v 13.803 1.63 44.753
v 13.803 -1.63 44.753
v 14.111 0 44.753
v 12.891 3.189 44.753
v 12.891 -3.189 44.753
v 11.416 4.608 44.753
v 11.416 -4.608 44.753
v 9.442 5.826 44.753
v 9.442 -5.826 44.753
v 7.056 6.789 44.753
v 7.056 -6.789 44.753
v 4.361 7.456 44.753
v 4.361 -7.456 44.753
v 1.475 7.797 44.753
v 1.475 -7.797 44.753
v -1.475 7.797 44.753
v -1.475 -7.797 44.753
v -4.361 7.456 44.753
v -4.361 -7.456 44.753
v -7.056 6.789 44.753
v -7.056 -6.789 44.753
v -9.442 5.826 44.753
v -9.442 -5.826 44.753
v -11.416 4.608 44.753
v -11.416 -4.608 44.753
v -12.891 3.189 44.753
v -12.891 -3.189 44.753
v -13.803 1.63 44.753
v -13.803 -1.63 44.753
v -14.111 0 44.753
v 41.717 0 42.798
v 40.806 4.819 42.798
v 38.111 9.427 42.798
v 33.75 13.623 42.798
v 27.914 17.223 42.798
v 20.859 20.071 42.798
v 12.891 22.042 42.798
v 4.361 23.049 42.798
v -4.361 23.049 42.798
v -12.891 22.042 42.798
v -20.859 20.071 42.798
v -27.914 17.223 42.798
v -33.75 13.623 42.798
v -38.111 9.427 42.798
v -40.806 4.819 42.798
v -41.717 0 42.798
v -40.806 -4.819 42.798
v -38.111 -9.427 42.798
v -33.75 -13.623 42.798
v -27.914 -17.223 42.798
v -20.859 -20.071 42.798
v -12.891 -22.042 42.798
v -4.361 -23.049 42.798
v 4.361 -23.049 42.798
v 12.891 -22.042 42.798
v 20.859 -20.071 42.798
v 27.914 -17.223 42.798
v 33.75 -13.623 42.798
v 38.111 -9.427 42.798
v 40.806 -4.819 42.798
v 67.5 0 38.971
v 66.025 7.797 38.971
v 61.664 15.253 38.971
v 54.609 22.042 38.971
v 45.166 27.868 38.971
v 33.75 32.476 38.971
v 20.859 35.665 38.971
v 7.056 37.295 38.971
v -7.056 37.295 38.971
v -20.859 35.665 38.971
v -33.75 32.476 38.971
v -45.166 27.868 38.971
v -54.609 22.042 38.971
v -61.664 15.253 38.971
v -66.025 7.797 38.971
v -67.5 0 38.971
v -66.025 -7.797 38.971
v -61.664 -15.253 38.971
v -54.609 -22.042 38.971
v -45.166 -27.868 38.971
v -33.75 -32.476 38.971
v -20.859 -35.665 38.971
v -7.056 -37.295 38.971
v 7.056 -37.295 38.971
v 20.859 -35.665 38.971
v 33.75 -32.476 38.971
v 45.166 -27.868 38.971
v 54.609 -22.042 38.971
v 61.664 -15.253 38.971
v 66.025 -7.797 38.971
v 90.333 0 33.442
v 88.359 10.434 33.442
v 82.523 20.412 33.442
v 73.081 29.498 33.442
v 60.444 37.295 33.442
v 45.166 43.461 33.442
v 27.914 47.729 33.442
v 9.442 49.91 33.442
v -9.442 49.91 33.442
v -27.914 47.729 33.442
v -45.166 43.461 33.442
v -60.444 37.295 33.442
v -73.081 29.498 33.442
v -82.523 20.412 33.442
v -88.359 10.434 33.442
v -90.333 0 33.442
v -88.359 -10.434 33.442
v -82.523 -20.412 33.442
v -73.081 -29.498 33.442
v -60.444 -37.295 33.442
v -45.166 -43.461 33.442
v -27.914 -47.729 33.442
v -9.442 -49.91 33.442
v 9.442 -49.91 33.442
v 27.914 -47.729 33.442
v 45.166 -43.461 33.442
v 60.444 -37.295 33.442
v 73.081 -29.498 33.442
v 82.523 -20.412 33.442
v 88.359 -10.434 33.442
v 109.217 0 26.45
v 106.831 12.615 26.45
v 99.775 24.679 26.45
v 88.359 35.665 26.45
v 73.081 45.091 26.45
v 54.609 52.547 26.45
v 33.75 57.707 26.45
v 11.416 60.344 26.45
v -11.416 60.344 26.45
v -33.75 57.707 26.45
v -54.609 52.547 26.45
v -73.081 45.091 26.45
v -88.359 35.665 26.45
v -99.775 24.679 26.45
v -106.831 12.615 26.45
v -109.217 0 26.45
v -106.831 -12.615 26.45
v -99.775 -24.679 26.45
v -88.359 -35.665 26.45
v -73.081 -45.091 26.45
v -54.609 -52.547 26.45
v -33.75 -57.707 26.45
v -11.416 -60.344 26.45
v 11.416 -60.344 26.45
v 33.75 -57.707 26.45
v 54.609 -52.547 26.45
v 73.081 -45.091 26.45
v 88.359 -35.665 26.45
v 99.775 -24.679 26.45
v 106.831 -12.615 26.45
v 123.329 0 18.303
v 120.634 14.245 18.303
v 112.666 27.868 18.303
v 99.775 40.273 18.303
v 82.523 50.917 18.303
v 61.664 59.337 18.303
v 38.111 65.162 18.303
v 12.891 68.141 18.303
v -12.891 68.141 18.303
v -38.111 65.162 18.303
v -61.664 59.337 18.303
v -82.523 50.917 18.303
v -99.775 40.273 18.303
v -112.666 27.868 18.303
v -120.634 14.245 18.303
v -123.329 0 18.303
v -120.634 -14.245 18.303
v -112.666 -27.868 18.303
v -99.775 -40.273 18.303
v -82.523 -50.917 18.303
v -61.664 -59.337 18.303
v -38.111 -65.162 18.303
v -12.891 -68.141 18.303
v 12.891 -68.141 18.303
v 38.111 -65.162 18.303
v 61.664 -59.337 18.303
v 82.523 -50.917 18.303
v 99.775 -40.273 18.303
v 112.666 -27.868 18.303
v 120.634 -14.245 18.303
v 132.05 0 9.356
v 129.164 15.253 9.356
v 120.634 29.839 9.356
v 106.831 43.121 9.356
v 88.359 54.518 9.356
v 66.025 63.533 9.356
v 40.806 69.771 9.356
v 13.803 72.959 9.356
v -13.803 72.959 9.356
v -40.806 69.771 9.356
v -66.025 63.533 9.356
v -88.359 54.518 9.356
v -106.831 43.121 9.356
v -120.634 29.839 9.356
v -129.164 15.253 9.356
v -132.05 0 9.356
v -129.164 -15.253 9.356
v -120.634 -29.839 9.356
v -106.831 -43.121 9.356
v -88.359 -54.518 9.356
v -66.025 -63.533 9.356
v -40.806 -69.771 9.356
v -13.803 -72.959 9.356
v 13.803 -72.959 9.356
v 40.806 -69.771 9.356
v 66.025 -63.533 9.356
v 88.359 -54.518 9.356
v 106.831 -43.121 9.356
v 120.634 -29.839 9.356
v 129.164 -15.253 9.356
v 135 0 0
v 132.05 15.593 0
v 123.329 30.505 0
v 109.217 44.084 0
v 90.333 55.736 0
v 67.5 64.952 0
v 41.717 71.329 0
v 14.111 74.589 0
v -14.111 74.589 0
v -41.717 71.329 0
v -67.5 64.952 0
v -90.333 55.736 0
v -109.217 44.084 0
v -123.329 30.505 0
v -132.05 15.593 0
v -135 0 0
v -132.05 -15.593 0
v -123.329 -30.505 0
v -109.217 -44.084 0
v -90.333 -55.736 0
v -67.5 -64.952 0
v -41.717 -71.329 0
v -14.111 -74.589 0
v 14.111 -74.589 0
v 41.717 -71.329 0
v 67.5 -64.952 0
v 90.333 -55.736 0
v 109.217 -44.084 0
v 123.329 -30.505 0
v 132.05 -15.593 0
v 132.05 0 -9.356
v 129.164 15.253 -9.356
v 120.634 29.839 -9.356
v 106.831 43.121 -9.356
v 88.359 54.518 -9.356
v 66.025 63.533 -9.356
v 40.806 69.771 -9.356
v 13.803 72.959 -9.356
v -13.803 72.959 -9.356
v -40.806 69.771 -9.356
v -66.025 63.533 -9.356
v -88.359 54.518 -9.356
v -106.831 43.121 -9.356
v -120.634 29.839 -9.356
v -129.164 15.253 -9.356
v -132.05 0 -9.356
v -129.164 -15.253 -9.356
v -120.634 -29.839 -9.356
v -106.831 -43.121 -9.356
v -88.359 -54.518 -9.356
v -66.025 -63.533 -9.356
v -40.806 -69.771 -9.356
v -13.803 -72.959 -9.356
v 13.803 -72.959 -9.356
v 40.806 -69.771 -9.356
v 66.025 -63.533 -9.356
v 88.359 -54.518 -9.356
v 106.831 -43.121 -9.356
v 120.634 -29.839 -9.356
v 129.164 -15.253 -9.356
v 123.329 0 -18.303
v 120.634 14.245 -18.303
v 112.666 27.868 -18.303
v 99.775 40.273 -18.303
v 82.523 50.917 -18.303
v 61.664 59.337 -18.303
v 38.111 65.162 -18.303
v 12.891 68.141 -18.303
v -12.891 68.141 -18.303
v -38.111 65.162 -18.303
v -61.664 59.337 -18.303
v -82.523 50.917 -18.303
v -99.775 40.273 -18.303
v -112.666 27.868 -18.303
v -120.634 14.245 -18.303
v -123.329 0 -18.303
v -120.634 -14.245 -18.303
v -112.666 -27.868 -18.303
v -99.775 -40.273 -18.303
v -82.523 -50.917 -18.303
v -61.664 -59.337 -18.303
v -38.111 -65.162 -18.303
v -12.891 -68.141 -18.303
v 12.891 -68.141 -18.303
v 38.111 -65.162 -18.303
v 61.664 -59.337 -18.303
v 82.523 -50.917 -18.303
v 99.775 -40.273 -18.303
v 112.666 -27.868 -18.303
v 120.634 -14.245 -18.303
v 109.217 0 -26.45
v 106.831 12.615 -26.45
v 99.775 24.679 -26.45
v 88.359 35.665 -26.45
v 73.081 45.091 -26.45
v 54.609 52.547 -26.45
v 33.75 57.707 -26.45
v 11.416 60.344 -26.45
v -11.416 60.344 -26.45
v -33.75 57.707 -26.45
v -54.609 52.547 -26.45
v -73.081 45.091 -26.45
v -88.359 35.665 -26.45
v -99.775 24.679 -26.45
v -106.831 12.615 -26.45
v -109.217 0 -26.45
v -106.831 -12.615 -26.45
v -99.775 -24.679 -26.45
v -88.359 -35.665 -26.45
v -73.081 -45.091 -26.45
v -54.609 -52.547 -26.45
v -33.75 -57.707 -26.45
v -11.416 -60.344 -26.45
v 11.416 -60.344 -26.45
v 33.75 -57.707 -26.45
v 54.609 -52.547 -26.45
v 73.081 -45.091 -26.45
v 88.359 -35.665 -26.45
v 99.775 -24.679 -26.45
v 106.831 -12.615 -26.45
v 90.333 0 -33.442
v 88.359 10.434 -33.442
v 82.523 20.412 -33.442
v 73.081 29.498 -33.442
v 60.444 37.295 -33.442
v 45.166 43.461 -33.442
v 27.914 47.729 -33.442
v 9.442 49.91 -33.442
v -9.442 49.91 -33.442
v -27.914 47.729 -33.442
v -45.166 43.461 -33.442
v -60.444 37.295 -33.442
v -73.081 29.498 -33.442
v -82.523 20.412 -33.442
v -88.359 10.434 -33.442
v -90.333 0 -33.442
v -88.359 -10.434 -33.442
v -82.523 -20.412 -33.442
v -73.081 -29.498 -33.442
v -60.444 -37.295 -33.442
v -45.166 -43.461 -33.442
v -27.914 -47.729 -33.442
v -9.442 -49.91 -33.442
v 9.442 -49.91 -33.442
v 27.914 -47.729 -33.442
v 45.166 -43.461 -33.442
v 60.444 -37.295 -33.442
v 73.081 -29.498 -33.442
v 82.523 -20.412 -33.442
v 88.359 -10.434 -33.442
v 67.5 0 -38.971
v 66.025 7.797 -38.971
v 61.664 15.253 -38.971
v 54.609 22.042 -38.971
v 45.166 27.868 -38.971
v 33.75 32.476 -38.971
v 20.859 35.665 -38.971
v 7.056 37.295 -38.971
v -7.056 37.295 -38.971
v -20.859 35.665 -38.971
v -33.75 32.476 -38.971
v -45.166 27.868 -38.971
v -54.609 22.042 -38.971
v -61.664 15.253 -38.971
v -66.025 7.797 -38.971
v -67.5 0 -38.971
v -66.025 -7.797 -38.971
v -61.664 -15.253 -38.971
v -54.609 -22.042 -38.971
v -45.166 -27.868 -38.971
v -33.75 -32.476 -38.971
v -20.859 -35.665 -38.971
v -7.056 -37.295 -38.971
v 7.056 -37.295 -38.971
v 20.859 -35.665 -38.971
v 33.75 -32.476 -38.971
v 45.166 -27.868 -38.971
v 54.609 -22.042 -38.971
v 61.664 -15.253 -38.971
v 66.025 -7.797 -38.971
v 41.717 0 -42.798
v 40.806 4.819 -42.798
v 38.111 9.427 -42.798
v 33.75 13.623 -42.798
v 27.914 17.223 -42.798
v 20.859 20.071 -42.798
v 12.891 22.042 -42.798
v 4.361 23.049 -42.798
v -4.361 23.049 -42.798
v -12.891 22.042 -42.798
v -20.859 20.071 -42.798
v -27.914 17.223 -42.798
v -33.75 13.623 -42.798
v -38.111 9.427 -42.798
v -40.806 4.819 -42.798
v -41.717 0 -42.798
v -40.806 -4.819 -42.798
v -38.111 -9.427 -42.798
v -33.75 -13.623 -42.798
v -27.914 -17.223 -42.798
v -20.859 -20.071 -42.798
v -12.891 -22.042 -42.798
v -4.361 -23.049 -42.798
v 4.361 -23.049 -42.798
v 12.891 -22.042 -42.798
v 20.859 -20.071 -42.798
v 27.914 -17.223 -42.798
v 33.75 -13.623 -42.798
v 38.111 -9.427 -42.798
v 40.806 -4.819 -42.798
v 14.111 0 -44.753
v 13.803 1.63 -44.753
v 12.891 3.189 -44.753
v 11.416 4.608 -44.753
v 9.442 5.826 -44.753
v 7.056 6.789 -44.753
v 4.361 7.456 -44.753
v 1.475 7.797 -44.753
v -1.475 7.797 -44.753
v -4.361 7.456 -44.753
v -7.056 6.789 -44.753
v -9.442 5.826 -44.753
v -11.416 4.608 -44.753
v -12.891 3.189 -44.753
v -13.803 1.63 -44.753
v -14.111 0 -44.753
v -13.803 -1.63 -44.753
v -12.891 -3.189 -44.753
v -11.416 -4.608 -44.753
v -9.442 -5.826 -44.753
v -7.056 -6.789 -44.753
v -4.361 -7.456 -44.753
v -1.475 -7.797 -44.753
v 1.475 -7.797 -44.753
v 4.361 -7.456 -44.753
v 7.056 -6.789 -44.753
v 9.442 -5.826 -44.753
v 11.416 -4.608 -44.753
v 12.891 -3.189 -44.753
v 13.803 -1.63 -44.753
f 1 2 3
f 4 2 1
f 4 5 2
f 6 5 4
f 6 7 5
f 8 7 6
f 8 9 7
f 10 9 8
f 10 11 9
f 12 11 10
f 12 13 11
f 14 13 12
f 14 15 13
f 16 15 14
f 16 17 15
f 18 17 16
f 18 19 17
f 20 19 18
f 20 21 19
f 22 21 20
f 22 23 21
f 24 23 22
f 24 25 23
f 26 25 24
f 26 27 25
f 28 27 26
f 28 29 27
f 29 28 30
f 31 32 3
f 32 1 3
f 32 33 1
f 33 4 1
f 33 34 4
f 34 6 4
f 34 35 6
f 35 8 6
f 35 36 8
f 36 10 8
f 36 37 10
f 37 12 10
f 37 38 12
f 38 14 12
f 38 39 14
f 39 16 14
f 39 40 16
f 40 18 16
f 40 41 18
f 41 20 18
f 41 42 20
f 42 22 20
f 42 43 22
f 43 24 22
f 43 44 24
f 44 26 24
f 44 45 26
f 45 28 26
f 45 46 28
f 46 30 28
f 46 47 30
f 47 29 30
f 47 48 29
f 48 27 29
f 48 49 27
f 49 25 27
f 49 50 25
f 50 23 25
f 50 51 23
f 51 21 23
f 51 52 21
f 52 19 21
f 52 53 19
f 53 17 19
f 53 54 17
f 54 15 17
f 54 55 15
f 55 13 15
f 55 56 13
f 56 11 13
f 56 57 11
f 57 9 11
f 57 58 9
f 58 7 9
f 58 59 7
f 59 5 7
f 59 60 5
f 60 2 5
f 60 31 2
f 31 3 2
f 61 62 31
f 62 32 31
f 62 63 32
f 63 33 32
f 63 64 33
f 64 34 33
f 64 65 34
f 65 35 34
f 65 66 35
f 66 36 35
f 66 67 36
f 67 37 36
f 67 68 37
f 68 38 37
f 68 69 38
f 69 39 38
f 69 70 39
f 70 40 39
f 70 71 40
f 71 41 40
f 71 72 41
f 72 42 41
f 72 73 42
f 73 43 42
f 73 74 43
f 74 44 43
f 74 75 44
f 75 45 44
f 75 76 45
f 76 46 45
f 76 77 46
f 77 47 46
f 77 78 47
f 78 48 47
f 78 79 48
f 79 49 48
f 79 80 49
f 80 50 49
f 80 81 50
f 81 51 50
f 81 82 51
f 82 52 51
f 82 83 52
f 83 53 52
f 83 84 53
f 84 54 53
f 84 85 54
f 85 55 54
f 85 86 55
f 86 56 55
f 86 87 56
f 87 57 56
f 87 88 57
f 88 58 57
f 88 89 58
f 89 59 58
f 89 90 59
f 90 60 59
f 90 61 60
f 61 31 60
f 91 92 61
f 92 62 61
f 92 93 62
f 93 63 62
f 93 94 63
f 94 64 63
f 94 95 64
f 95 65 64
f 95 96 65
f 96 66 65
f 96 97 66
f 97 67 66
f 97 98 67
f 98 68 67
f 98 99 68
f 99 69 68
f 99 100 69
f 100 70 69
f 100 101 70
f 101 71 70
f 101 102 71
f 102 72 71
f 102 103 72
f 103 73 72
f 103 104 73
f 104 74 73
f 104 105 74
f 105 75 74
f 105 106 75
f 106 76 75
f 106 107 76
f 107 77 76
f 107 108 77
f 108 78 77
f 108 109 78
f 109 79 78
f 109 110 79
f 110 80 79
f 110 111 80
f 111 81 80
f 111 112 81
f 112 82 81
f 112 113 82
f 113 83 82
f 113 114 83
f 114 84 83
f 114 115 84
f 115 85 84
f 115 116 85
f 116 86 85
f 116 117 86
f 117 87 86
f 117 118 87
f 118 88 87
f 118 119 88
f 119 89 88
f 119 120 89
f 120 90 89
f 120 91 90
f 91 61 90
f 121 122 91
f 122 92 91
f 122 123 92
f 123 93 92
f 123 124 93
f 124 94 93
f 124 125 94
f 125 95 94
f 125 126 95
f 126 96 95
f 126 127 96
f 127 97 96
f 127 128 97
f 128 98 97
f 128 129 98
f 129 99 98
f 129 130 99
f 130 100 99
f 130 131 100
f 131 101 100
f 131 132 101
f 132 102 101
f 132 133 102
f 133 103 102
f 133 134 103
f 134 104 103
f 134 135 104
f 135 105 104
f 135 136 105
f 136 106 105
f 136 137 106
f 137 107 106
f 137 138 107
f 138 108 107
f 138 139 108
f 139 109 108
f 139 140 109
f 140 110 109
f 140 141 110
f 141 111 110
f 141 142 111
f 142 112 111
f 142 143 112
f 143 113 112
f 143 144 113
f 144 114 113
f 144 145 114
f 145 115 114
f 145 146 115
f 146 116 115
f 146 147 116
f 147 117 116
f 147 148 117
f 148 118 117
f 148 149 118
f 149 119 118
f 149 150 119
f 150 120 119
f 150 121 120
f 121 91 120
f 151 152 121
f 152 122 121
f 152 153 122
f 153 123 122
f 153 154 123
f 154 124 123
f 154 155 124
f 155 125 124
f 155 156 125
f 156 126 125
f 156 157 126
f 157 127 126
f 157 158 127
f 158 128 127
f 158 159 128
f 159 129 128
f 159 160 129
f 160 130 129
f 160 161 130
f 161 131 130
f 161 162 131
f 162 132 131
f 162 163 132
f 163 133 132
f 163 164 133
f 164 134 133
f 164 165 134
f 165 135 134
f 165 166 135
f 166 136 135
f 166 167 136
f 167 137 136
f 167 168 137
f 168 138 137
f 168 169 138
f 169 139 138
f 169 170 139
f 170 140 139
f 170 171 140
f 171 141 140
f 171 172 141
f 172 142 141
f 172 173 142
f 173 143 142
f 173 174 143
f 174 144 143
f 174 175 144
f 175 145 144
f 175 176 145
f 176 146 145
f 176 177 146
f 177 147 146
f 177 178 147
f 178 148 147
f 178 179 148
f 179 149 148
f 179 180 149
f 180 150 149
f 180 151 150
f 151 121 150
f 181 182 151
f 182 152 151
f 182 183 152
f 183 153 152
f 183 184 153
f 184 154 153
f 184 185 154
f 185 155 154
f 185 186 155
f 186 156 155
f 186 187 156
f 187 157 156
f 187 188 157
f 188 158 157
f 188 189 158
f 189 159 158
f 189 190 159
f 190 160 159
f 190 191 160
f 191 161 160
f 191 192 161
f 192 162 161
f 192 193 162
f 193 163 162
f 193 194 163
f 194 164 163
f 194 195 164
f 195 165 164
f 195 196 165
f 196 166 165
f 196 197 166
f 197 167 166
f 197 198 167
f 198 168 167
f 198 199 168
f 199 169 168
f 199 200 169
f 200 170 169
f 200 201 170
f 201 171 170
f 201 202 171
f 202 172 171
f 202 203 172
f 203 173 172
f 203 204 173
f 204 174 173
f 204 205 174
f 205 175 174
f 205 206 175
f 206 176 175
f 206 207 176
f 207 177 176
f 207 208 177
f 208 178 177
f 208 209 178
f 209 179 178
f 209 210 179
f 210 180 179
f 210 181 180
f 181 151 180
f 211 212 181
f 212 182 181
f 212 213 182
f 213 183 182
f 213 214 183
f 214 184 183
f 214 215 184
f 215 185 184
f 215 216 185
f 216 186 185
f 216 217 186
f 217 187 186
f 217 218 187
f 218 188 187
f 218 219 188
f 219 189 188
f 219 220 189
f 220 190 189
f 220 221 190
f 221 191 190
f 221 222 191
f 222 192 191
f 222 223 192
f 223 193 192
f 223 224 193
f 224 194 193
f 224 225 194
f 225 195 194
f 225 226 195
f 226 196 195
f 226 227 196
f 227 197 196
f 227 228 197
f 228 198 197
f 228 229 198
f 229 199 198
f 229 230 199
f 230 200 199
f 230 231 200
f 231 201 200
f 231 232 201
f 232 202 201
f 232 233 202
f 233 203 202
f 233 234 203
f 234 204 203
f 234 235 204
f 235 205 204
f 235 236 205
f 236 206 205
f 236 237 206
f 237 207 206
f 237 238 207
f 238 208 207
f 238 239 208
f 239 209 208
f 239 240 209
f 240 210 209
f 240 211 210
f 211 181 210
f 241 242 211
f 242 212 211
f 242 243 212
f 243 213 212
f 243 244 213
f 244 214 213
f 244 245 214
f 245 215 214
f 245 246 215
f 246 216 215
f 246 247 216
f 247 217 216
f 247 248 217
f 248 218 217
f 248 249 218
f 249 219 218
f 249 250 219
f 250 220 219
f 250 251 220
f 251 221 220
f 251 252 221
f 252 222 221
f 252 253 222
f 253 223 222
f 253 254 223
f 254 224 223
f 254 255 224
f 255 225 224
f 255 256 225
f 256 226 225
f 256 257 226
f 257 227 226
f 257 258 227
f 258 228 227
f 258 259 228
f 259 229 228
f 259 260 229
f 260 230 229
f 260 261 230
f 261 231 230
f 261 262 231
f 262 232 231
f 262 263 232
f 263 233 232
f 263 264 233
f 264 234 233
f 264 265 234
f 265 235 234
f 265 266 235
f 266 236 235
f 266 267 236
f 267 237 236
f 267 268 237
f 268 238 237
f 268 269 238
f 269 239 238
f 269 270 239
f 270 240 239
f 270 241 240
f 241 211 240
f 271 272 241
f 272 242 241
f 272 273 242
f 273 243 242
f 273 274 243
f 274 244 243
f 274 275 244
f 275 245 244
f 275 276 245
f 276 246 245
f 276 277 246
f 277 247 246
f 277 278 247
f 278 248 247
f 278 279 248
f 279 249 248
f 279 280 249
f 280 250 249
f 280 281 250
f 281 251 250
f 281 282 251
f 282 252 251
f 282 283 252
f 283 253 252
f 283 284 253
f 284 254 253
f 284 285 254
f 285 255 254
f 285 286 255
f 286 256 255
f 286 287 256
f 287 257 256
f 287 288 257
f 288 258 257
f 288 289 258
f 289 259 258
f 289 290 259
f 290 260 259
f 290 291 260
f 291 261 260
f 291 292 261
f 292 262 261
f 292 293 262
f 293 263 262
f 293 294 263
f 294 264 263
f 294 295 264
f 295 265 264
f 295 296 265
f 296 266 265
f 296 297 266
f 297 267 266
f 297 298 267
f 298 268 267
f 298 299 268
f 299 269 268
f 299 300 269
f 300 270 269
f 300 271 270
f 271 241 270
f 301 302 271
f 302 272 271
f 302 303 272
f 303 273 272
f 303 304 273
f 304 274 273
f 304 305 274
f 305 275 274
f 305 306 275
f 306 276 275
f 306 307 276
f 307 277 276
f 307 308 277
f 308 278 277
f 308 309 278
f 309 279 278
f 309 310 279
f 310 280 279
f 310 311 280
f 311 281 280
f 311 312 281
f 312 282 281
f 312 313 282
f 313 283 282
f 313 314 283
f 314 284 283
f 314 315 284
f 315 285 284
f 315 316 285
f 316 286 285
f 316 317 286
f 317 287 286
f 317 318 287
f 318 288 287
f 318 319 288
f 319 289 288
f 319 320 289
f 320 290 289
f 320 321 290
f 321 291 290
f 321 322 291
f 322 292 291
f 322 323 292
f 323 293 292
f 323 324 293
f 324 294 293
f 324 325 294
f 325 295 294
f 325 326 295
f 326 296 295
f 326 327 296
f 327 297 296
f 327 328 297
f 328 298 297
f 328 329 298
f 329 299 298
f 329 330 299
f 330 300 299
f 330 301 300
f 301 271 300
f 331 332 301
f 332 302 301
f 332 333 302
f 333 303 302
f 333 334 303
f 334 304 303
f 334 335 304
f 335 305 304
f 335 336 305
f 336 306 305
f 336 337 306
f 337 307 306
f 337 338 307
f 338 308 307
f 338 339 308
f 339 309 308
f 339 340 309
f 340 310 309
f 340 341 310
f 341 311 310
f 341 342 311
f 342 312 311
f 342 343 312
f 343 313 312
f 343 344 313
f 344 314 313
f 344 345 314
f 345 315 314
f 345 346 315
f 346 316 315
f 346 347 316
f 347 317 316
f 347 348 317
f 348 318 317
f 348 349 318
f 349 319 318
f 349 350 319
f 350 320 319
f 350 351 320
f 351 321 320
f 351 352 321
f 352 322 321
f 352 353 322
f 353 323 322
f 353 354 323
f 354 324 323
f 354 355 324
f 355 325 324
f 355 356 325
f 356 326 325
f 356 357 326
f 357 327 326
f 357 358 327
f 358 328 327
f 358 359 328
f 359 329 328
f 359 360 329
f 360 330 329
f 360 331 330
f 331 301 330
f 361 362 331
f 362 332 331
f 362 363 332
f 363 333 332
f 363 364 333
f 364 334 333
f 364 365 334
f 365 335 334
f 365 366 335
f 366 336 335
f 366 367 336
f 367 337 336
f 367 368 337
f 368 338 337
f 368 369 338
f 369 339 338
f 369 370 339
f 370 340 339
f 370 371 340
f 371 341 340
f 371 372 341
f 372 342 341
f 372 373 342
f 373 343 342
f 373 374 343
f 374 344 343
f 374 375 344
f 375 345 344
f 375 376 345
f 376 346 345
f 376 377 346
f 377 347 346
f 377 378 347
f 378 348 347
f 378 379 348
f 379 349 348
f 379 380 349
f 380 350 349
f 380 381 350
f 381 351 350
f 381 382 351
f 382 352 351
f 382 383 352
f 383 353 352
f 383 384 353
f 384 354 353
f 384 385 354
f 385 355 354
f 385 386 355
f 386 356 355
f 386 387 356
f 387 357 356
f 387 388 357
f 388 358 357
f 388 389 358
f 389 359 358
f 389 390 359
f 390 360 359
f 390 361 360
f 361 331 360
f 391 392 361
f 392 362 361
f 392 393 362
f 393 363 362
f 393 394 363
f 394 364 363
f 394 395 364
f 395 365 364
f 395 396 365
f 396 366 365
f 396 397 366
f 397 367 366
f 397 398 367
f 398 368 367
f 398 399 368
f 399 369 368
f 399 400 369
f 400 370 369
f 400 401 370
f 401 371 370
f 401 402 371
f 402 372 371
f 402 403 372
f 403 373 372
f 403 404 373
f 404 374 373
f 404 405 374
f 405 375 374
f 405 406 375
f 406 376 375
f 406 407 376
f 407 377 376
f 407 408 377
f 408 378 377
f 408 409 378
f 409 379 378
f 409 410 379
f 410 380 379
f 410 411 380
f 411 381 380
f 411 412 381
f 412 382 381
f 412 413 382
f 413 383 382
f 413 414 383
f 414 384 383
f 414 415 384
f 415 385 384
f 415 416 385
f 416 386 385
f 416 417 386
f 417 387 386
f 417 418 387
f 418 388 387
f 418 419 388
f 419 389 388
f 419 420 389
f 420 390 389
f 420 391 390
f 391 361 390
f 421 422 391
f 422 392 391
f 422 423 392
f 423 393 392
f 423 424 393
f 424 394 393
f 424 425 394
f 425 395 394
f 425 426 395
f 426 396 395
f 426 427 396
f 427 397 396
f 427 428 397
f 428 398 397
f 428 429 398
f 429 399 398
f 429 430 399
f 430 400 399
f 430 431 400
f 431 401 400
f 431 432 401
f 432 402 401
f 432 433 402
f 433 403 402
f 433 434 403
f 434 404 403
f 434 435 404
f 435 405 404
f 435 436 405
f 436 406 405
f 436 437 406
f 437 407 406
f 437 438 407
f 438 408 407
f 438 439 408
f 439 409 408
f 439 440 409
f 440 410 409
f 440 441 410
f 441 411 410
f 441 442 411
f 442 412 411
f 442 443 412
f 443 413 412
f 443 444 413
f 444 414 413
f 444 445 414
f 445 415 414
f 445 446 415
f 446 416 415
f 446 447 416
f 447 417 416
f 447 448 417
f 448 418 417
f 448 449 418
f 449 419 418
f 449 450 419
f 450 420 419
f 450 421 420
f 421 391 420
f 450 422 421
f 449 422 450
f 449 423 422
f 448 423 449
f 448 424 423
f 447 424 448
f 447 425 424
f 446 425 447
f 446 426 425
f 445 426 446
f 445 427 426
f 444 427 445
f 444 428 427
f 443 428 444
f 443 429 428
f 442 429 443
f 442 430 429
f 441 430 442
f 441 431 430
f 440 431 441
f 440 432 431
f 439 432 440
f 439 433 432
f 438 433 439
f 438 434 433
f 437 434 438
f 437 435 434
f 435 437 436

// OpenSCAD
// Generated by SolidPython 1.0.1 on 2020-07-29 00:46:48


scale(v = [9, 5, 3]) {
	sphere(r = 15);
}
/***********************************************
*********      SolidPython code:      **********
************************************************
 
# import packages: SolidPython
from solid import *
from solid.utils import *
from itertools import chain, combinations, permutations


class Resize:

    def __init__(self, scad_file):
        self.scad_file = scad_file
        #self.scad_file = import_scad(scad_file)
        # cone/cylinder param:
        self.r1 = 0
        self.r2 = 0
        self.h = 0
        # rectangular prism param:
        self.w = 0
        self.l = 0
        # ellipse param:
        self.r = 0

    # import OpenScad code (file name corresponds to shape)


    # classify shape + parameters
    def assign(self, param1, param2, param3):
        if self.scad_file == 'cone.scad':
            self.r1 = param1
            self.r2 = param2
            self.h = param3
        elif self.scad_file == 'cylinder.scad':
            self.r1 = param1
            self.r2 = param2
            self.h = param3
        elif self.scad_file == 'rectangularPrism.scad':
            self.h = param1
            self.l = param2
            self.w = param3
        else:
            self.r = param1
            self.h = param2

    # resize parameters
    def iterate(self):
        x = range(3, 20, 2)
        i = 1
        if self.scad_file == 'cone.scad':
            tempList = list(permutations(x, 2))
            for temp in tempList:
                param1 = temp[0]
                param2 = temp[1]
                filepath = 'produced_scad_files/' + 'cone' + str(param1) + '_' + str(param2) + '_' + '.scad'
                scad_render_to_file(cylinder(h=param1, r1=param2, r2=0), filepath)

        elif self.scad_file == 'cylinder.scad':
            tempList = list(permutations(x, 3))
            for temp in tempList:
                param1 = temp[0]
                param2 = temp[1]
                filepath = 'produced_scad_files/' + 'cylinder' + str(param1) + '_' + str(param2) + '_' + '.scad'
                scad_render_to_file(cylinder(h=param1, r1=param2, r2=param2), filepath)

        elif self.scad_file == 'rectangularPrism.scad':
            tempList = list(permutations(x, 3))
            for temp in tempList:
                param1 = temp[0]
                param2 = temp[1]
                param3 = temp[2]
                filepath = 'produced_scad_files/' + 'rectangularPrism' + str(param1) + '_' + str(param2) + '_' + str(
                    param3) + '.scad'
                scad_render_to_file(cube(size=(param1, param2, param3)), filepath)

        elif self.scad_file == 'ellipse.scad':
            tempList = list(permutations(x, 4))
            for temp in tempList:
                param1 = temp[0]
                param2 = temp[1]
                param3 = temp[2]
                param4 = temp[3]
                filepath = 'produced_scad_files/' + 'ellipse' + str(param1) + '_' + str(param2) + '_' + str(param3) + '_' + str(param4) + '.scad'
                scad_render_to_file(scale([param1, param2, param3])(sphere(r=param4)), filepath)

    def render_to_scadfile(self):
        scad_render_to_file(scad, 'example.scad') 
 
************************************************/
